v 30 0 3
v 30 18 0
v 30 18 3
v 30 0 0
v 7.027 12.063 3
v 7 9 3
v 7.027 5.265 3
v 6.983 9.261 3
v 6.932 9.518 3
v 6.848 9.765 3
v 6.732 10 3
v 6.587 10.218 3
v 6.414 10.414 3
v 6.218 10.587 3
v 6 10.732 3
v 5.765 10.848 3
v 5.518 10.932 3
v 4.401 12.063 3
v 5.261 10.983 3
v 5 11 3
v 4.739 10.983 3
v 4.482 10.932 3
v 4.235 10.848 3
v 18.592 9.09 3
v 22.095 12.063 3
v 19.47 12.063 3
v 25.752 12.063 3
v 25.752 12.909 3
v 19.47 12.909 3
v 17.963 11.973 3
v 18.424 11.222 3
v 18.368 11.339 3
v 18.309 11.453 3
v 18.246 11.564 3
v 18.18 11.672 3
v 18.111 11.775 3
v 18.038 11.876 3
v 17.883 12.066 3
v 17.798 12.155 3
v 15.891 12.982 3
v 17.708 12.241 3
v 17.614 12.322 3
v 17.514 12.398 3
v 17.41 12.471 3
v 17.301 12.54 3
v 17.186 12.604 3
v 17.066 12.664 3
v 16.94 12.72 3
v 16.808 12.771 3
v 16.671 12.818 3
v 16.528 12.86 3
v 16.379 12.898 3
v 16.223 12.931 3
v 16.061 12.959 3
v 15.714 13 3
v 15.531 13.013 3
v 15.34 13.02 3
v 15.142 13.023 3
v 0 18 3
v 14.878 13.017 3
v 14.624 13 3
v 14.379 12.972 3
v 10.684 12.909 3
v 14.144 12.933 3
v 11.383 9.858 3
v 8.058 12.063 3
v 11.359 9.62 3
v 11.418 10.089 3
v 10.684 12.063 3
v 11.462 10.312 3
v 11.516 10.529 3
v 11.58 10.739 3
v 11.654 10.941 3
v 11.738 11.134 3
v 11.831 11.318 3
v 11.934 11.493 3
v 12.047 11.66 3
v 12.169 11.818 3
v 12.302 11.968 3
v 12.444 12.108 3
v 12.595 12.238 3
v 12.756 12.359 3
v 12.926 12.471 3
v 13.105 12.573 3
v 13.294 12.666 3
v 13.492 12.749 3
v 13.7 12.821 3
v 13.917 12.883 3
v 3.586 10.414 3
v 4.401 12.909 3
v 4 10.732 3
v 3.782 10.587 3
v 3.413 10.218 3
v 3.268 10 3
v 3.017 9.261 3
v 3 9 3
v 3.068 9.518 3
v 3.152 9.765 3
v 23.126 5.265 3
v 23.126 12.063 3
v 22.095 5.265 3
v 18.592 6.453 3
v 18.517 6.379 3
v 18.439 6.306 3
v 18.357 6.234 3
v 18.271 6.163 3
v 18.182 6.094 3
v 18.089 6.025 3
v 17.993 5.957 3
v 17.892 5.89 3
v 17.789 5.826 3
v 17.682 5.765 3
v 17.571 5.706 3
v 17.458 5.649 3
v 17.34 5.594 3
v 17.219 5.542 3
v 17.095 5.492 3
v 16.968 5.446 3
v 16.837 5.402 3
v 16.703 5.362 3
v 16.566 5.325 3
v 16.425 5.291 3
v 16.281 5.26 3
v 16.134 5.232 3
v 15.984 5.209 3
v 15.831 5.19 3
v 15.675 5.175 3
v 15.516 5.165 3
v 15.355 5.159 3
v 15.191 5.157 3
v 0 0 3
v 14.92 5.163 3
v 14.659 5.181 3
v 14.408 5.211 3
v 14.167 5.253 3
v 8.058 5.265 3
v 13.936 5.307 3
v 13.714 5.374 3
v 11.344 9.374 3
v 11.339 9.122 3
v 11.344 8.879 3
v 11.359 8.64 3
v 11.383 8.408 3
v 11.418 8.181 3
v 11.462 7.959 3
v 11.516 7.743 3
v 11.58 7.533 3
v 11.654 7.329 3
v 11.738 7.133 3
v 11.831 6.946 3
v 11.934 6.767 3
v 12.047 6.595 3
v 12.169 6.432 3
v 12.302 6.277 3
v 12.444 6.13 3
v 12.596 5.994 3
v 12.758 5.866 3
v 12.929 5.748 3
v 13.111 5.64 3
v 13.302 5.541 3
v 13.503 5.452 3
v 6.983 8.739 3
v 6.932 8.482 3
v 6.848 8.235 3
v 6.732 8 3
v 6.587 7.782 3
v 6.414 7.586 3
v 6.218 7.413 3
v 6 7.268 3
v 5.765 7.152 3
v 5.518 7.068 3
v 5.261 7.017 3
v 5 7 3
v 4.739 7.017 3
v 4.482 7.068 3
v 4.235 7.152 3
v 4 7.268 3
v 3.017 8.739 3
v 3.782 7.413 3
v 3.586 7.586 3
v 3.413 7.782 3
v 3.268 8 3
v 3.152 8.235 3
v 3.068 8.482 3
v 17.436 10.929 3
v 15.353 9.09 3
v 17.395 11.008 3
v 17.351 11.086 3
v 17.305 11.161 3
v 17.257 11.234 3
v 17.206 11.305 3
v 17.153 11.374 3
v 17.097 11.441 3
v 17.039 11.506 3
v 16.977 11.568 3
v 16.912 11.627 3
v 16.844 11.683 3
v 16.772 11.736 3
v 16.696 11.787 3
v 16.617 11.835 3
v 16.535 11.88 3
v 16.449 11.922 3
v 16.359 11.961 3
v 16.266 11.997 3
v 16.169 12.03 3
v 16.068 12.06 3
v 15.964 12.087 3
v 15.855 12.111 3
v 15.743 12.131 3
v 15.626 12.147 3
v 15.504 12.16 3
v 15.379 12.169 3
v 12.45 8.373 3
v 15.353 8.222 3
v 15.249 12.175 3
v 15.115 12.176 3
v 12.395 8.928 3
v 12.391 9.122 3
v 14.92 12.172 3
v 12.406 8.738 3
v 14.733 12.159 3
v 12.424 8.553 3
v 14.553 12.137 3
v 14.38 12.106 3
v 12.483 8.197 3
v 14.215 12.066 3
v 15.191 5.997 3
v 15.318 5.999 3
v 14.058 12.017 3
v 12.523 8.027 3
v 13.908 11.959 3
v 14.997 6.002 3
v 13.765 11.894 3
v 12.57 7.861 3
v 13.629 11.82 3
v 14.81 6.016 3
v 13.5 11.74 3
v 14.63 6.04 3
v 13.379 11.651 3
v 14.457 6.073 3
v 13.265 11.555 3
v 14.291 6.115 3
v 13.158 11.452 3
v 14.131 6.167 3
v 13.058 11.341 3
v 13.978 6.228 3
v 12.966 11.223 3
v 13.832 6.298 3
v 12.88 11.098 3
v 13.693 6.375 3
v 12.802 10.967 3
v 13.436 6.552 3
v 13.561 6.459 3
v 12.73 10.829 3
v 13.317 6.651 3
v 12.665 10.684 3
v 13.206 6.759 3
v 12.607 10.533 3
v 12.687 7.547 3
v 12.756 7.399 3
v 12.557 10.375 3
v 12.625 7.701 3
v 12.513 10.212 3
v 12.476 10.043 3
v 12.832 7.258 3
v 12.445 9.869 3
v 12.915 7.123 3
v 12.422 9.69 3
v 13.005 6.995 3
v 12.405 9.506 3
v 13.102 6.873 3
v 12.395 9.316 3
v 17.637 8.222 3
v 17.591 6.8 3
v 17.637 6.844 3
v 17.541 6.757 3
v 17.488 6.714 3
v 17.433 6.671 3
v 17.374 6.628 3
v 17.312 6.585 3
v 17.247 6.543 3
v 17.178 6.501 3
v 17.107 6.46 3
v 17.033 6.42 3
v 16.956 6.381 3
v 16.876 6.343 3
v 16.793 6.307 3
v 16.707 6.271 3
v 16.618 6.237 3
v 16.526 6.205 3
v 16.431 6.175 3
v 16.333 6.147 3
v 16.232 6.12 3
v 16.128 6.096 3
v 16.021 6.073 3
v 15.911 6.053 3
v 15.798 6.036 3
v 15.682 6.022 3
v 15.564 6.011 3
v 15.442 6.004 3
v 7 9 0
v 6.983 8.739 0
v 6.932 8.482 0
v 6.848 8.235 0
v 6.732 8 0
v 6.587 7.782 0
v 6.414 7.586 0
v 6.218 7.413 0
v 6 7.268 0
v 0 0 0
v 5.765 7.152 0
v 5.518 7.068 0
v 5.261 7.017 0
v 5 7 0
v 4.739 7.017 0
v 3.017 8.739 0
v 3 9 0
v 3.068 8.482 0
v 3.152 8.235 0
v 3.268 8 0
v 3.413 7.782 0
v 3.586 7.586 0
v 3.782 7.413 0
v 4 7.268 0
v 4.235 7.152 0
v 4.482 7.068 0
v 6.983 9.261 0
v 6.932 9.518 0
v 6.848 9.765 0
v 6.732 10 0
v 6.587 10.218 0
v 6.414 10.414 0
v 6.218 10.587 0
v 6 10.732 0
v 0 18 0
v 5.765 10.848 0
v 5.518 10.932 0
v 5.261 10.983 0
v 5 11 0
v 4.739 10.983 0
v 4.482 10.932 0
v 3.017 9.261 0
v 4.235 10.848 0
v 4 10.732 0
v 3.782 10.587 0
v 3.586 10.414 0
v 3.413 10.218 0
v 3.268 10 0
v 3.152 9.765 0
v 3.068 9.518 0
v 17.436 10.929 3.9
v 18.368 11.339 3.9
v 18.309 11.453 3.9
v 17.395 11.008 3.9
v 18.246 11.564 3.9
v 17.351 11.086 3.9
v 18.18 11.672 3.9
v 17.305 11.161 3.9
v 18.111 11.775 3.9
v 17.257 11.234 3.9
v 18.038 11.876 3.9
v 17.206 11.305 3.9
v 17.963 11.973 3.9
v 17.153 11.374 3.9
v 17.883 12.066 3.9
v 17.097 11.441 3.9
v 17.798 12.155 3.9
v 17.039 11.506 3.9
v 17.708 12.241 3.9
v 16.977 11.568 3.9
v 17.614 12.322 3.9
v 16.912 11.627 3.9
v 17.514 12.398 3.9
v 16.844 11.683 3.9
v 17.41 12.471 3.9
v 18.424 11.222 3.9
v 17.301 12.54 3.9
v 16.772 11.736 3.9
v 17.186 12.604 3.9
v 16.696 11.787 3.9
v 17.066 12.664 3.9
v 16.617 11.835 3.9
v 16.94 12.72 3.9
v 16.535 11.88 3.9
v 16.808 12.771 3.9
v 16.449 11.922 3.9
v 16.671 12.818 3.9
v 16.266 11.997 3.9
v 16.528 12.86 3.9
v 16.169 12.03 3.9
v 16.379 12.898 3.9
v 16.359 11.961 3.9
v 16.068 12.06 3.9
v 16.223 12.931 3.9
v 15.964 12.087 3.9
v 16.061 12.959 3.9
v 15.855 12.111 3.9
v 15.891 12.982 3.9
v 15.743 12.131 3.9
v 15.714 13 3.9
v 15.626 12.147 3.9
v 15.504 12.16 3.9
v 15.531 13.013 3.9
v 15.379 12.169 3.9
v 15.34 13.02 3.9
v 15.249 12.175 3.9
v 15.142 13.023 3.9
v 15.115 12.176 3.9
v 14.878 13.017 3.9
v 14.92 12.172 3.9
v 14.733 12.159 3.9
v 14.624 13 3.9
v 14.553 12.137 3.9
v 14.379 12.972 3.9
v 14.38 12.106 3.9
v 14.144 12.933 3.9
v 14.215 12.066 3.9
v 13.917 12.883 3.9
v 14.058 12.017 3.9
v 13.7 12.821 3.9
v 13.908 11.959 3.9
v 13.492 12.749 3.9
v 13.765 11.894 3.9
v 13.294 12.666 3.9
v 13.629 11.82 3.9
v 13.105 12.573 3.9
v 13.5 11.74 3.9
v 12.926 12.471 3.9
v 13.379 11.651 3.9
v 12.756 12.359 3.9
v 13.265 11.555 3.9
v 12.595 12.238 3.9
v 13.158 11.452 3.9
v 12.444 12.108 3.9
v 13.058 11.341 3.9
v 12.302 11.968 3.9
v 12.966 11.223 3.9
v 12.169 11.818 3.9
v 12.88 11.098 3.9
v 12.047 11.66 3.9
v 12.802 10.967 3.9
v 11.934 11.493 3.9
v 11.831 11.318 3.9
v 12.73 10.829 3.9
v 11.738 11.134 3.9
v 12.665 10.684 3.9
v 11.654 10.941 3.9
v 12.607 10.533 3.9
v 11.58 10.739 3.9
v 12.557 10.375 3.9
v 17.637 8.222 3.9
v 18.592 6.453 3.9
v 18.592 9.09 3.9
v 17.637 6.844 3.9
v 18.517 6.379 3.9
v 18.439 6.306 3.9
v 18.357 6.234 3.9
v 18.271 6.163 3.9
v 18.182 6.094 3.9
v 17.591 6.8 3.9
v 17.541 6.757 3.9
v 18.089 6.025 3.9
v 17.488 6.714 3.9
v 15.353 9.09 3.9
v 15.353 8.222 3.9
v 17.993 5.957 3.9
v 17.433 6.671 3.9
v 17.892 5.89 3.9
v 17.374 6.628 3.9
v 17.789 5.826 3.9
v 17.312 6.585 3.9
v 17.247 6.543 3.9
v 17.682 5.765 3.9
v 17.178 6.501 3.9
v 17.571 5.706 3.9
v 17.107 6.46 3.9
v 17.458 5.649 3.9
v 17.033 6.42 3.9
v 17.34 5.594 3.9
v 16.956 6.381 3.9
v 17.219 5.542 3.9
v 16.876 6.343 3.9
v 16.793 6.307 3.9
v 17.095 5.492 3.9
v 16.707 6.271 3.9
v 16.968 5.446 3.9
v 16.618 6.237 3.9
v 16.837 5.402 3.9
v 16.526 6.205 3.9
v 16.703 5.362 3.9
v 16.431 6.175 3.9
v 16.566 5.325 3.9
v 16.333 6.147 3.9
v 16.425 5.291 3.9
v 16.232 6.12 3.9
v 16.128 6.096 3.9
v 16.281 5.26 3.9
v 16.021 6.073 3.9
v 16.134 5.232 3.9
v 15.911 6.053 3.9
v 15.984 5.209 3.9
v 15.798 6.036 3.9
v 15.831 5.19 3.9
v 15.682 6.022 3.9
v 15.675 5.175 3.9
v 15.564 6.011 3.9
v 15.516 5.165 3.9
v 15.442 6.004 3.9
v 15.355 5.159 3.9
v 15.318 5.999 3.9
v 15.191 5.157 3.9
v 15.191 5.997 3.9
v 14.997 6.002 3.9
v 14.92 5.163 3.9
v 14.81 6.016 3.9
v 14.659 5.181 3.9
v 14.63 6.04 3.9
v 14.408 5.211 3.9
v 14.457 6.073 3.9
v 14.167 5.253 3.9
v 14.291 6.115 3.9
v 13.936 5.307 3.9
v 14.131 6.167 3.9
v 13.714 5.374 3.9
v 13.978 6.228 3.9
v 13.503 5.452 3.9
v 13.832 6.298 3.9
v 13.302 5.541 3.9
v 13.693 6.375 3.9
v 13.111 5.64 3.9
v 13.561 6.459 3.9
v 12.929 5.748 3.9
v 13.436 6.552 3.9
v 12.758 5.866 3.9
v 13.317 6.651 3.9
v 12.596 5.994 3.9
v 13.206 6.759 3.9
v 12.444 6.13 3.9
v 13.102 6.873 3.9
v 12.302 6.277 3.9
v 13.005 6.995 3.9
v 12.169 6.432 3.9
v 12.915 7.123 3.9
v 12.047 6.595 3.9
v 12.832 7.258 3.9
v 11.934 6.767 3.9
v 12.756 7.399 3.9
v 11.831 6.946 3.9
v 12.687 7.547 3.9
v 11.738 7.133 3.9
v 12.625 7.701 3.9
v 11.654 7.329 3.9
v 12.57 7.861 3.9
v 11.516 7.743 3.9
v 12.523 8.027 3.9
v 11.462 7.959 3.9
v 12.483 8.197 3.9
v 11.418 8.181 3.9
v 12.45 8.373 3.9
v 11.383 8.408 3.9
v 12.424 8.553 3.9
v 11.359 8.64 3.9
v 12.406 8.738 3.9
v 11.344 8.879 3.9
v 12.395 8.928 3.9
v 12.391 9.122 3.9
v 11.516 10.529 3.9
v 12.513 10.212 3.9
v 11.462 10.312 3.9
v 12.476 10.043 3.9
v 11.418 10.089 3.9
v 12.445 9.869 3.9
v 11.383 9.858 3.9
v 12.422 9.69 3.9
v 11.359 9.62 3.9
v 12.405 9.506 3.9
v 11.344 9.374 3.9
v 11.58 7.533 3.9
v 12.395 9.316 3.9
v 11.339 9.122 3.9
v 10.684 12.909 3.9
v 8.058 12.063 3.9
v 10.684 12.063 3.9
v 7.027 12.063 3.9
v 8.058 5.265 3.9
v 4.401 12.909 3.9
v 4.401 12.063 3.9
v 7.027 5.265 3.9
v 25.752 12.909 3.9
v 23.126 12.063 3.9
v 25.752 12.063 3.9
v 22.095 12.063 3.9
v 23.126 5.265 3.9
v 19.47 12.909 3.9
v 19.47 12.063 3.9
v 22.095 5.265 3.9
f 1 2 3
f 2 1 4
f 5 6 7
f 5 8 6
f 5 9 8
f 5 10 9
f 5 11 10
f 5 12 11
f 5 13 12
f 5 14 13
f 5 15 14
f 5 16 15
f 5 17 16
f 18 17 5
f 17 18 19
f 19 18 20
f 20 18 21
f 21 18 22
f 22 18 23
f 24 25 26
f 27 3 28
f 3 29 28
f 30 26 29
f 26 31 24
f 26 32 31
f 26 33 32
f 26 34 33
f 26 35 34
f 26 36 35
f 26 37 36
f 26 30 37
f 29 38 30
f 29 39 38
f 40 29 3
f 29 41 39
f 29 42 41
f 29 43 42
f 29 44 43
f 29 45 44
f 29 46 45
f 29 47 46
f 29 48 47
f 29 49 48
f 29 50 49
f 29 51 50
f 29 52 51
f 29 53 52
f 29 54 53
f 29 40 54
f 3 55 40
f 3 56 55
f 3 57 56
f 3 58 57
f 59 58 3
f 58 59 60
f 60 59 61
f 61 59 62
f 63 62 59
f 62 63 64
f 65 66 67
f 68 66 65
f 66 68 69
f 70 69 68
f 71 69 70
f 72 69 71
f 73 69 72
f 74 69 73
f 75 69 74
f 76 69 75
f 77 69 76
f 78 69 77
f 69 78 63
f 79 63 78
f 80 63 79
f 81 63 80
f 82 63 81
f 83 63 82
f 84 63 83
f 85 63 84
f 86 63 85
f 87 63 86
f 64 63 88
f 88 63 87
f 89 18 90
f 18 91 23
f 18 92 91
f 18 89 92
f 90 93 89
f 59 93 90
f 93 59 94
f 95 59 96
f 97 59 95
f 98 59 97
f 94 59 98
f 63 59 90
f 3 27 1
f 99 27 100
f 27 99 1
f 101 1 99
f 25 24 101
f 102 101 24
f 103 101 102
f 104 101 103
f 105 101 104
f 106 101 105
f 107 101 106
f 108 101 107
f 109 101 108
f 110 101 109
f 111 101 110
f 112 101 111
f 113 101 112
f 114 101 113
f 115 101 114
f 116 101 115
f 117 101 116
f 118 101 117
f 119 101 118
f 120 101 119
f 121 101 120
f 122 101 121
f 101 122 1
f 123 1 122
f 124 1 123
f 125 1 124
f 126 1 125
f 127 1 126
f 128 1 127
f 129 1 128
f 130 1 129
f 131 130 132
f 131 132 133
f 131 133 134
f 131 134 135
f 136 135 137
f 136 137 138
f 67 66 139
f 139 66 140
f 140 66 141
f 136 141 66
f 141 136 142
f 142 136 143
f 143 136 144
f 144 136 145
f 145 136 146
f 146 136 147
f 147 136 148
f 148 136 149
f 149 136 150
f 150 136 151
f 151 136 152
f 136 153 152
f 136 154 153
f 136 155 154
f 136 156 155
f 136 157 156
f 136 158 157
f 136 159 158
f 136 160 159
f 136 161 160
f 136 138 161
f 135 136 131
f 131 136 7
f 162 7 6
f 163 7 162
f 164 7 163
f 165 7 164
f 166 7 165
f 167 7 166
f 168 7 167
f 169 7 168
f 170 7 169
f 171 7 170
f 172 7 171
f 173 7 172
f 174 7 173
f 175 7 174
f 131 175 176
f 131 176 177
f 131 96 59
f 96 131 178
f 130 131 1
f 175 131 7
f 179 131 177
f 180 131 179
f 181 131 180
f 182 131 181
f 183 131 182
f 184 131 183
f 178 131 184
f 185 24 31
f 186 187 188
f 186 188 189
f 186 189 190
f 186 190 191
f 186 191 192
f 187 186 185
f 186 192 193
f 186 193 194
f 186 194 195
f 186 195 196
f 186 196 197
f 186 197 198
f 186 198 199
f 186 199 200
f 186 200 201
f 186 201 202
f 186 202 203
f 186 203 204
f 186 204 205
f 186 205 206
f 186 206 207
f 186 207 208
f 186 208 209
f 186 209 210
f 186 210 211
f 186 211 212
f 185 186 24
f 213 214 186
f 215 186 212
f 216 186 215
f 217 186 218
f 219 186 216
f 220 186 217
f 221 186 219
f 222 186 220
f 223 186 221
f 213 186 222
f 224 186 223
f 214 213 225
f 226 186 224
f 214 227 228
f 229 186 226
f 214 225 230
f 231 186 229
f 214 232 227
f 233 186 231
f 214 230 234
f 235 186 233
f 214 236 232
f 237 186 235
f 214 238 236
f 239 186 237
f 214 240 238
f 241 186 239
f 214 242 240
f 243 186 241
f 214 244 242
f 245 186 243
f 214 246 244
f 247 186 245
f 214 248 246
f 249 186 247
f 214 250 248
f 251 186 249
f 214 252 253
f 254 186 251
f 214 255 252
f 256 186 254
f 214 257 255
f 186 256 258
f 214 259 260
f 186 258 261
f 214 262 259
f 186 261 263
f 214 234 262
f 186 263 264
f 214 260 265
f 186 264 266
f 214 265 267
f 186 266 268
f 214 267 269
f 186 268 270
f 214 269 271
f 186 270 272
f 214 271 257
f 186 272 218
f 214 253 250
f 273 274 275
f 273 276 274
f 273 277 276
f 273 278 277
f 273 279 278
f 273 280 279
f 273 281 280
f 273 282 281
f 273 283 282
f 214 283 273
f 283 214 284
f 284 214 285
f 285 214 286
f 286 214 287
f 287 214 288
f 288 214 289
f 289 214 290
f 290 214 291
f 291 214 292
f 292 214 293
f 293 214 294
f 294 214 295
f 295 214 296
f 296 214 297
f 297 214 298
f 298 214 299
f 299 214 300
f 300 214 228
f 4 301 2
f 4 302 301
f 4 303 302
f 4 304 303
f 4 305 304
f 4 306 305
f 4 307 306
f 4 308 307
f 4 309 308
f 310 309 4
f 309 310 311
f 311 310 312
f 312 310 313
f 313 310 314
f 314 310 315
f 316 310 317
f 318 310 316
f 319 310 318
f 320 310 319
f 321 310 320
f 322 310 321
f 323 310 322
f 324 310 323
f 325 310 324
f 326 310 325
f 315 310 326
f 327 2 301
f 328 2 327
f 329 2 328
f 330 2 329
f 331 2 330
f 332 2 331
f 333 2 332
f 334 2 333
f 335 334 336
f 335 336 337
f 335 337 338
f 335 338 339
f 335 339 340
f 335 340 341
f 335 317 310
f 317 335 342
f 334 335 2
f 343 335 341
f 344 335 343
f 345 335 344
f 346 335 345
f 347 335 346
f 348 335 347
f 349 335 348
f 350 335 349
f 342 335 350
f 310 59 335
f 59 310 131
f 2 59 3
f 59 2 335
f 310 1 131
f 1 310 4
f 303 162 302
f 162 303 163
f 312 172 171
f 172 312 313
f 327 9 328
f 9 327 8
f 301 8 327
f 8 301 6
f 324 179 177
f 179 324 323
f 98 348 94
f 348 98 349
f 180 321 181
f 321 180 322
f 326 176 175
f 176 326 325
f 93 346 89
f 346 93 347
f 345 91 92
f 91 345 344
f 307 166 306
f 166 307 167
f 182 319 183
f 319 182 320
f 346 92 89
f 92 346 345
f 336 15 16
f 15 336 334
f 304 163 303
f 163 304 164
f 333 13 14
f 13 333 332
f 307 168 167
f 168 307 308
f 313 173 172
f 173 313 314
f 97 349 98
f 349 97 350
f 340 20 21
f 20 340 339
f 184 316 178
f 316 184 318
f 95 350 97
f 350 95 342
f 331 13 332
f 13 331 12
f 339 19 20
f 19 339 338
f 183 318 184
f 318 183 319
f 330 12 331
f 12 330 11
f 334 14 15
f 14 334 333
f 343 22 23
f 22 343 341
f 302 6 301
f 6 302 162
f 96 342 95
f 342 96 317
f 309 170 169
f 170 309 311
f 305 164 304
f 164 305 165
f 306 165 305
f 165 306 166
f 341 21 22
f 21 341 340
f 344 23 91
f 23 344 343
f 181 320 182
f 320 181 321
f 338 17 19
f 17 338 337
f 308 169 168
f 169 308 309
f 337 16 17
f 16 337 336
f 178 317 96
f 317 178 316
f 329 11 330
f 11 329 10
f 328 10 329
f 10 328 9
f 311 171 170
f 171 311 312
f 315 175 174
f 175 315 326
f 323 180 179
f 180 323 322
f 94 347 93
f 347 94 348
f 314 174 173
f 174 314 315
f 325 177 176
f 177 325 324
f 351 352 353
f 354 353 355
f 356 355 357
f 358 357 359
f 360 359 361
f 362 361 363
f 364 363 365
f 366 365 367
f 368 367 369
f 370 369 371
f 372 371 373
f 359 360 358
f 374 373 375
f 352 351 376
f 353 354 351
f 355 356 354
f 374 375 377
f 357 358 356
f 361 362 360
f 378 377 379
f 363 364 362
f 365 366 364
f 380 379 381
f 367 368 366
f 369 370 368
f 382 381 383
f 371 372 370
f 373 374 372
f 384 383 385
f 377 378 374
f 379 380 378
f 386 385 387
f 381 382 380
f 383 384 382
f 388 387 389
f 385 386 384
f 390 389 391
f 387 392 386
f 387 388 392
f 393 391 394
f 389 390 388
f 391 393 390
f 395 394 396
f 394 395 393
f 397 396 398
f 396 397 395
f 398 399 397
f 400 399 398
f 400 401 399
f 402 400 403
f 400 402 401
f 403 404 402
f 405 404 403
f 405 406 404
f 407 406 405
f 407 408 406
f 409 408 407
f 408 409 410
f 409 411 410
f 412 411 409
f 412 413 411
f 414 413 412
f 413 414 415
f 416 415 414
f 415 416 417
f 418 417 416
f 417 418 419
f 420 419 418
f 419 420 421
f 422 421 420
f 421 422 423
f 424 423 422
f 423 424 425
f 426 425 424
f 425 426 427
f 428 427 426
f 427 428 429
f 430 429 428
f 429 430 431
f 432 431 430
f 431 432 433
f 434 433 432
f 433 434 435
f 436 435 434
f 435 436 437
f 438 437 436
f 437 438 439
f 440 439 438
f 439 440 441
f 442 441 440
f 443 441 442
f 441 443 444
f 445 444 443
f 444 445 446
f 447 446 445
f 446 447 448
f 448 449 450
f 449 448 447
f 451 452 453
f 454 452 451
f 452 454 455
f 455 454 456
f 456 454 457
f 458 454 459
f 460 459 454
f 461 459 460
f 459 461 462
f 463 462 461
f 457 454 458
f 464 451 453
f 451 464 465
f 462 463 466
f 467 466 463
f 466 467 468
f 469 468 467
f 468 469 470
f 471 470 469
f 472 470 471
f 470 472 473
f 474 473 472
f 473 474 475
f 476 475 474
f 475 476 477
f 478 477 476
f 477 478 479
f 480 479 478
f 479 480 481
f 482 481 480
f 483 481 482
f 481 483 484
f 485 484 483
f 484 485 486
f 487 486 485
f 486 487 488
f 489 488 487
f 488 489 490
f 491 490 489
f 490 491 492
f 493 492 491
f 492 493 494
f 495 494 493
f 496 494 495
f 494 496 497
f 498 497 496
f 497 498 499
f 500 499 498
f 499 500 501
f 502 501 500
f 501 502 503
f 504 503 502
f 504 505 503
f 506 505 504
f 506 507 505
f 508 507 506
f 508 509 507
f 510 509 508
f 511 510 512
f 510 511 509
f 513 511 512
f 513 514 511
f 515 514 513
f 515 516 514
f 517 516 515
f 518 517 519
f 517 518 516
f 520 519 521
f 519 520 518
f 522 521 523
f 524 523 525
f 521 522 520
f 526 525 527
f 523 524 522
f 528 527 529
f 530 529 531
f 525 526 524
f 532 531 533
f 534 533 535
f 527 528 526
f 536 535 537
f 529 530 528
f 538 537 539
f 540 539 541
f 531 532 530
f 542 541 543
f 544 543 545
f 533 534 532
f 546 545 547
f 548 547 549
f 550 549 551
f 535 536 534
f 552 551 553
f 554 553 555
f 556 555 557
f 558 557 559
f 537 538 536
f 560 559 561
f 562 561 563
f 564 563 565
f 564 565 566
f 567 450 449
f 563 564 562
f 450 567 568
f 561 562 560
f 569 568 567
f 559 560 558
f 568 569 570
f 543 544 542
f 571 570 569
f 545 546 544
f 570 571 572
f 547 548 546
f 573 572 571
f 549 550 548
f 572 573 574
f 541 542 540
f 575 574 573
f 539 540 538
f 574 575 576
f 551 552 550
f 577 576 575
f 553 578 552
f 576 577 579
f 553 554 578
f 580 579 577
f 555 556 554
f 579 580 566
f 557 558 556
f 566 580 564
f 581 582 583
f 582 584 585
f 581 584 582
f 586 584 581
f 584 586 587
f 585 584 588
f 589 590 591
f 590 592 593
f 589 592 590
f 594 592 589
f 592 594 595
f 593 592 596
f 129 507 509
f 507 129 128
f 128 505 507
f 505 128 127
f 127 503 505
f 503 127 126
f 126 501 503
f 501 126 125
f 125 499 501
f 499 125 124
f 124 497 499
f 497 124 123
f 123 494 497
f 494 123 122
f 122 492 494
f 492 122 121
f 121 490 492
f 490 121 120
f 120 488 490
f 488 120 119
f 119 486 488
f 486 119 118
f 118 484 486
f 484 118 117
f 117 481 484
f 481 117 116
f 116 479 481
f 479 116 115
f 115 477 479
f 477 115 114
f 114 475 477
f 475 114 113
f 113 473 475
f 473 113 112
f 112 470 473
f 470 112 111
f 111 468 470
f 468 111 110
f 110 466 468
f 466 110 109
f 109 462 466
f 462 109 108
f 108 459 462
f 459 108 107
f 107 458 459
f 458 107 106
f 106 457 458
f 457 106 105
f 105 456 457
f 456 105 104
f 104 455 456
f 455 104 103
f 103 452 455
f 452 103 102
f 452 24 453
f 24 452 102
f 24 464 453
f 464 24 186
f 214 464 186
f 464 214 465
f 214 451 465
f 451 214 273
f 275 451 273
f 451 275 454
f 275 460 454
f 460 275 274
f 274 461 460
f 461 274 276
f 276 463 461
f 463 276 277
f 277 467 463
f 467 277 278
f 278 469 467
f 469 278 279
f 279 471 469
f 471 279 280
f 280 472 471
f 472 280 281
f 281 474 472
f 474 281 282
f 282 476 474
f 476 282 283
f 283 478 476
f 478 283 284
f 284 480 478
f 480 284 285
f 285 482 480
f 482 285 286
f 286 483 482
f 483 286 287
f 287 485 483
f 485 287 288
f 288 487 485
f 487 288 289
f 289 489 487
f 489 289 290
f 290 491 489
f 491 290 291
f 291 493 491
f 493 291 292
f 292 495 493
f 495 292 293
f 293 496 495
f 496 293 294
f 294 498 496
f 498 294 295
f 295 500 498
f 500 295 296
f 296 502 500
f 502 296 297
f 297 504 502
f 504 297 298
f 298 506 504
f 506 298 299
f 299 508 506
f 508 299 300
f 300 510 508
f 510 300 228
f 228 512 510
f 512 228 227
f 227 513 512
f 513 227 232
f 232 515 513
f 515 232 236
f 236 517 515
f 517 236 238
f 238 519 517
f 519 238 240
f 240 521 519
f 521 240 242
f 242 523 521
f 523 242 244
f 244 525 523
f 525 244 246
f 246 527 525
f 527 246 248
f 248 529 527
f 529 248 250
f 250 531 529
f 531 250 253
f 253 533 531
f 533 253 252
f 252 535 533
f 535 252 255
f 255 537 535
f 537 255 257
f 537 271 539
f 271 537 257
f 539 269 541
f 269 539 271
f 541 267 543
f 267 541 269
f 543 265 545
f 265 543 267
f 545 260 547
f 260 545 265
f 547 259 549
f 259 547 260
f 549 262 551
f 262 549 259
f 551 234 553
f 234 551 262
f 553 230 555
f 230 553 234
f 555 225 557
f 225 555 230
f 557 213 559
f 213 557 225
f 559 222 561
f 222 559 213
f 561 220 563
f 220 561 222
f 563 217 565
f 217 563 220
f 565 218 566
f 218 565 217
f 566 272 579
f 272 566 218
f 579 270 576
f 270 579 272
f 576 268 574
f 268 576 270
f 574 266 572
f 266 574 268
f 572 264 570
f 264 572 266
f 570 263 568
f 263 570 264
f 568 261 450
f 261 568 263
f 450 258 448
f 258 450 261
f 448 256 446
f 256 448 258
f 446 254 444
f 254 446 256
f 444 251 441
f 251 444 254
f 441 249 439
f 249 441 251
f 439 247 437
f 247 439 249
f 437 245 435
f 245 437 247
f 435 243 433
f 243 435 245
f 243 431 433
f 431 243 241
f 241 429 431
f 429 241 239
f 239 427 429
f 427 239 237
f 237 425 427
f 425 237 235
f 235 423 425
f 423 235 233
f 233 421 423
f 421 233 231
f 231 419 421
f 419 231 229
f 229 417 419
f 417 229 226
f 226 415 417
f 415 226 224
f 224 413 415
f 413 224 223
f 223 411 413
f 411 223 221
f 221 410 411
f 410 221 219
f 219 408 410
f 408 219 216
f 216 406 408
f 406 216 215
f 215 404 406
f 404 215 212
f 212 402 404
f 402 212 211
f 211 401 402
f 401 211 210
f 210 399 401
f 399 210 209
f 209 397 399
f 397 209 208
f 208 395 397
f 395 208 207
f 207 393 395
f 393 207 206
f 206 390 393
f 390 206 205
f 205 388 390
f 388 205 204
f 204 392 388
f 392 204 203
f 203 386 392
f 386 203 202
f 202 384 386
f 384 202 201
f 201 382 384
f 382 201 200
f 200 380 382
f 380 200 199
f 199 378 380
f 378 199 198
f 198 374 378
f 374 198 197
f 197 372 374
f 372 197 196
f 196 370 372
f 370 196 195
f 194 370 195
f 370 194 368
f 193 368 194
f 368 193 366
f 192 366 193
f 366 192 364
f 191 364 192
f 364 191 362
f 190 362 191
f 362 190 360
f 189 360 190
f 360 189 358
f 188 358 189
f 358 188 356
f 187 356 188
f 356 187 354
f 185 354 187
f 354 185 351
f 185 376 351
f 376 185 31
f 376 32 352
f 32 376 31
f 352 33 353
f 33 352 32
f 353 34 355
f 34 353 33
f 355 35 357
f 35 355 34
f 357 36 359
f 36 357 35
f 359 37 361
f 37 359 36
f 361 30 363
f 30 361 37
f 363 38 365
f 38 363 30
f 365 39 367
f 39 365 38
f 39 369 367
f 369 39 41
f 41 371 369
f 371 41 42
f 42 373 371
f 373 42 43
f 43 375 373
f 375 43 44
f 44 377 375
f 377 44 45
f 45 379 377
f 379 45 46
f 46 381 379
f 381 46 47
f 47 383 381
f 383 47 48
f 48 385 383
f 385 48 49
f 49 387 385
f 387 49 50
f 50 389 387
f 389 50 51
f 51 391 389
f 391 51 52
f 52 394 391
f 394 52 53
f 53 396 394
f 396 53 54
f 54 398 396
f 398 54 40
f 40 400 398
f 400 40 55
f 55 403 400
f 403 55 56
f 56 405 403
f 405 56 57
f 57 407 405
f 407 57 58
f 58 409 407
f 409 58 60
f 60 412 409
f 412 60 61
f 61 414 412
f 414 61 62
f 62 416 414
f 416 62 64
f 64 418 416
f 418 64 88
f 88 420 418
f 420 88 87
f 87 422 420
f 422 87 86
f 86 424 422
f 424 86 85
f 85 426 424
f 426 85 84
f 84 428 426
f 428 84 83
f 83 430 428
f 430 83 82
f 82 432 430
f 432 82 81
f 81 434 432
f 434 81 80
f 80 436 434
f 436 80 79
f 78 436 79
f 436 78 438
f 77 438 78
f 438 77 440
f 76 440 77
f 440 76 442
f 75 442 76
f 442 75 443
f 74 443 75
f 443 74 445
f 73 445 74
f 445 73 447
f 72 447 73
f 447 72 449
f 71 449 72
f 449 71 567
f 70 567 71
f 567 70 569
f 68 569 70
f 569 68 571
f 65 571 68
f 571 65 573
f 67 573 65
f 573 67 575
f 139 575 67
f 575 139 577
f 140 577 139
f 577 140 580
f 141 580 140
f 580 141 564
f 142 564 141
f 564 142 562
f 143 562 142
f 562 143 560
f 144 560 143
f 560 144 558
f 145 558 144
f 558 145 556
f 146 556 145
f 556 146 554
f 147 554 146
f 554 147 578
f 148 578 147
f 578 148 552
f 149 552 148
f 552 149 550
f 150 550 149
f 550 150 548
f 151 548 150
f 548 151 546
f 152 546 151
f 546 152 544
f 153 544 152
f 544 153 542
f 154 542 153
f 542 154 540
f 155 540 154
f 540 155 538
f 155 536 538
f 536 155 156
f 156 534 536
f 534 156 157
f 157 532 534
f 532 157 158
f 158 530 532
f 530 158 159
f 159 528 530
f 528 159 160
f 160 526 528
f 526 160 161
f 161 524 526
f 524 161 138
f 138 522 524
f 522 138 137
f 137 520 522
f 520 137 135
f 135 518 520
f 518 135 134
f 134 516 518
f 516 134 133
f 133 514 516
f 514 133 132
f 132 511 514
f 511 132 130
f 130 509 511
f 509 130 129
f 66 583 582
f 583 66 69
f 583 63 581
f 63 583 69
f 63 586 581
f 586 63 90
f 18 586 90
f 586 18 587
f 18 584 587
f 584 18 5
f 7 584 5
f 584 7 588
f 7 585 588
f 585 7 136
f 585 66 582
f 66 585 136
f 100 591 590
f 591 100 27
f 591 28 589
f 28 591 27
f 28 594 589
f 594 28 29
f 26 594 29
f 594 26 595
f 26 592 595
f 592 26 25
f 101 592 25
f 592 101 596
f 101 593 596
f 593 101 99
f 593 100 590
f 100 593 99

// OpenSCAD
// Dimension Token Template
// Target Lunch Labs / createMPLS
// Units are millimeters.

// Main dimensions
width = 30;
depth = 18;
thickness = 3;

// Raised label settings
label_text = "TGT";   // Keep it short: 1-3 letters works best.
label_height = 0.9;
label_size = 8;

// Optional hole settings
use_hole = true;
hole_diameter = 4;
hole_center_from_edge = 5;

$fn = 48;

module token_base() {
    cube([width, depth, thickness], center = false);
}

module tag_hole() {
    translate([hole_center_from_edge, depth/2, -0.5])
        cylinder(h = thickness + 1, d = hole_diameter, center = false);
}

module raised_label() {
    translate([width/2, depth/2, thickness])
        linear_extrude(height = label_height)
            text(label_text, size = label_size, halign = "center", valign = "center");
}

// Final object
if (use_hole) {
    difference() {
        token_base();
        tag_hole();
    }
    raised_label();
} else {
    token_base();
    raised_label();
}
